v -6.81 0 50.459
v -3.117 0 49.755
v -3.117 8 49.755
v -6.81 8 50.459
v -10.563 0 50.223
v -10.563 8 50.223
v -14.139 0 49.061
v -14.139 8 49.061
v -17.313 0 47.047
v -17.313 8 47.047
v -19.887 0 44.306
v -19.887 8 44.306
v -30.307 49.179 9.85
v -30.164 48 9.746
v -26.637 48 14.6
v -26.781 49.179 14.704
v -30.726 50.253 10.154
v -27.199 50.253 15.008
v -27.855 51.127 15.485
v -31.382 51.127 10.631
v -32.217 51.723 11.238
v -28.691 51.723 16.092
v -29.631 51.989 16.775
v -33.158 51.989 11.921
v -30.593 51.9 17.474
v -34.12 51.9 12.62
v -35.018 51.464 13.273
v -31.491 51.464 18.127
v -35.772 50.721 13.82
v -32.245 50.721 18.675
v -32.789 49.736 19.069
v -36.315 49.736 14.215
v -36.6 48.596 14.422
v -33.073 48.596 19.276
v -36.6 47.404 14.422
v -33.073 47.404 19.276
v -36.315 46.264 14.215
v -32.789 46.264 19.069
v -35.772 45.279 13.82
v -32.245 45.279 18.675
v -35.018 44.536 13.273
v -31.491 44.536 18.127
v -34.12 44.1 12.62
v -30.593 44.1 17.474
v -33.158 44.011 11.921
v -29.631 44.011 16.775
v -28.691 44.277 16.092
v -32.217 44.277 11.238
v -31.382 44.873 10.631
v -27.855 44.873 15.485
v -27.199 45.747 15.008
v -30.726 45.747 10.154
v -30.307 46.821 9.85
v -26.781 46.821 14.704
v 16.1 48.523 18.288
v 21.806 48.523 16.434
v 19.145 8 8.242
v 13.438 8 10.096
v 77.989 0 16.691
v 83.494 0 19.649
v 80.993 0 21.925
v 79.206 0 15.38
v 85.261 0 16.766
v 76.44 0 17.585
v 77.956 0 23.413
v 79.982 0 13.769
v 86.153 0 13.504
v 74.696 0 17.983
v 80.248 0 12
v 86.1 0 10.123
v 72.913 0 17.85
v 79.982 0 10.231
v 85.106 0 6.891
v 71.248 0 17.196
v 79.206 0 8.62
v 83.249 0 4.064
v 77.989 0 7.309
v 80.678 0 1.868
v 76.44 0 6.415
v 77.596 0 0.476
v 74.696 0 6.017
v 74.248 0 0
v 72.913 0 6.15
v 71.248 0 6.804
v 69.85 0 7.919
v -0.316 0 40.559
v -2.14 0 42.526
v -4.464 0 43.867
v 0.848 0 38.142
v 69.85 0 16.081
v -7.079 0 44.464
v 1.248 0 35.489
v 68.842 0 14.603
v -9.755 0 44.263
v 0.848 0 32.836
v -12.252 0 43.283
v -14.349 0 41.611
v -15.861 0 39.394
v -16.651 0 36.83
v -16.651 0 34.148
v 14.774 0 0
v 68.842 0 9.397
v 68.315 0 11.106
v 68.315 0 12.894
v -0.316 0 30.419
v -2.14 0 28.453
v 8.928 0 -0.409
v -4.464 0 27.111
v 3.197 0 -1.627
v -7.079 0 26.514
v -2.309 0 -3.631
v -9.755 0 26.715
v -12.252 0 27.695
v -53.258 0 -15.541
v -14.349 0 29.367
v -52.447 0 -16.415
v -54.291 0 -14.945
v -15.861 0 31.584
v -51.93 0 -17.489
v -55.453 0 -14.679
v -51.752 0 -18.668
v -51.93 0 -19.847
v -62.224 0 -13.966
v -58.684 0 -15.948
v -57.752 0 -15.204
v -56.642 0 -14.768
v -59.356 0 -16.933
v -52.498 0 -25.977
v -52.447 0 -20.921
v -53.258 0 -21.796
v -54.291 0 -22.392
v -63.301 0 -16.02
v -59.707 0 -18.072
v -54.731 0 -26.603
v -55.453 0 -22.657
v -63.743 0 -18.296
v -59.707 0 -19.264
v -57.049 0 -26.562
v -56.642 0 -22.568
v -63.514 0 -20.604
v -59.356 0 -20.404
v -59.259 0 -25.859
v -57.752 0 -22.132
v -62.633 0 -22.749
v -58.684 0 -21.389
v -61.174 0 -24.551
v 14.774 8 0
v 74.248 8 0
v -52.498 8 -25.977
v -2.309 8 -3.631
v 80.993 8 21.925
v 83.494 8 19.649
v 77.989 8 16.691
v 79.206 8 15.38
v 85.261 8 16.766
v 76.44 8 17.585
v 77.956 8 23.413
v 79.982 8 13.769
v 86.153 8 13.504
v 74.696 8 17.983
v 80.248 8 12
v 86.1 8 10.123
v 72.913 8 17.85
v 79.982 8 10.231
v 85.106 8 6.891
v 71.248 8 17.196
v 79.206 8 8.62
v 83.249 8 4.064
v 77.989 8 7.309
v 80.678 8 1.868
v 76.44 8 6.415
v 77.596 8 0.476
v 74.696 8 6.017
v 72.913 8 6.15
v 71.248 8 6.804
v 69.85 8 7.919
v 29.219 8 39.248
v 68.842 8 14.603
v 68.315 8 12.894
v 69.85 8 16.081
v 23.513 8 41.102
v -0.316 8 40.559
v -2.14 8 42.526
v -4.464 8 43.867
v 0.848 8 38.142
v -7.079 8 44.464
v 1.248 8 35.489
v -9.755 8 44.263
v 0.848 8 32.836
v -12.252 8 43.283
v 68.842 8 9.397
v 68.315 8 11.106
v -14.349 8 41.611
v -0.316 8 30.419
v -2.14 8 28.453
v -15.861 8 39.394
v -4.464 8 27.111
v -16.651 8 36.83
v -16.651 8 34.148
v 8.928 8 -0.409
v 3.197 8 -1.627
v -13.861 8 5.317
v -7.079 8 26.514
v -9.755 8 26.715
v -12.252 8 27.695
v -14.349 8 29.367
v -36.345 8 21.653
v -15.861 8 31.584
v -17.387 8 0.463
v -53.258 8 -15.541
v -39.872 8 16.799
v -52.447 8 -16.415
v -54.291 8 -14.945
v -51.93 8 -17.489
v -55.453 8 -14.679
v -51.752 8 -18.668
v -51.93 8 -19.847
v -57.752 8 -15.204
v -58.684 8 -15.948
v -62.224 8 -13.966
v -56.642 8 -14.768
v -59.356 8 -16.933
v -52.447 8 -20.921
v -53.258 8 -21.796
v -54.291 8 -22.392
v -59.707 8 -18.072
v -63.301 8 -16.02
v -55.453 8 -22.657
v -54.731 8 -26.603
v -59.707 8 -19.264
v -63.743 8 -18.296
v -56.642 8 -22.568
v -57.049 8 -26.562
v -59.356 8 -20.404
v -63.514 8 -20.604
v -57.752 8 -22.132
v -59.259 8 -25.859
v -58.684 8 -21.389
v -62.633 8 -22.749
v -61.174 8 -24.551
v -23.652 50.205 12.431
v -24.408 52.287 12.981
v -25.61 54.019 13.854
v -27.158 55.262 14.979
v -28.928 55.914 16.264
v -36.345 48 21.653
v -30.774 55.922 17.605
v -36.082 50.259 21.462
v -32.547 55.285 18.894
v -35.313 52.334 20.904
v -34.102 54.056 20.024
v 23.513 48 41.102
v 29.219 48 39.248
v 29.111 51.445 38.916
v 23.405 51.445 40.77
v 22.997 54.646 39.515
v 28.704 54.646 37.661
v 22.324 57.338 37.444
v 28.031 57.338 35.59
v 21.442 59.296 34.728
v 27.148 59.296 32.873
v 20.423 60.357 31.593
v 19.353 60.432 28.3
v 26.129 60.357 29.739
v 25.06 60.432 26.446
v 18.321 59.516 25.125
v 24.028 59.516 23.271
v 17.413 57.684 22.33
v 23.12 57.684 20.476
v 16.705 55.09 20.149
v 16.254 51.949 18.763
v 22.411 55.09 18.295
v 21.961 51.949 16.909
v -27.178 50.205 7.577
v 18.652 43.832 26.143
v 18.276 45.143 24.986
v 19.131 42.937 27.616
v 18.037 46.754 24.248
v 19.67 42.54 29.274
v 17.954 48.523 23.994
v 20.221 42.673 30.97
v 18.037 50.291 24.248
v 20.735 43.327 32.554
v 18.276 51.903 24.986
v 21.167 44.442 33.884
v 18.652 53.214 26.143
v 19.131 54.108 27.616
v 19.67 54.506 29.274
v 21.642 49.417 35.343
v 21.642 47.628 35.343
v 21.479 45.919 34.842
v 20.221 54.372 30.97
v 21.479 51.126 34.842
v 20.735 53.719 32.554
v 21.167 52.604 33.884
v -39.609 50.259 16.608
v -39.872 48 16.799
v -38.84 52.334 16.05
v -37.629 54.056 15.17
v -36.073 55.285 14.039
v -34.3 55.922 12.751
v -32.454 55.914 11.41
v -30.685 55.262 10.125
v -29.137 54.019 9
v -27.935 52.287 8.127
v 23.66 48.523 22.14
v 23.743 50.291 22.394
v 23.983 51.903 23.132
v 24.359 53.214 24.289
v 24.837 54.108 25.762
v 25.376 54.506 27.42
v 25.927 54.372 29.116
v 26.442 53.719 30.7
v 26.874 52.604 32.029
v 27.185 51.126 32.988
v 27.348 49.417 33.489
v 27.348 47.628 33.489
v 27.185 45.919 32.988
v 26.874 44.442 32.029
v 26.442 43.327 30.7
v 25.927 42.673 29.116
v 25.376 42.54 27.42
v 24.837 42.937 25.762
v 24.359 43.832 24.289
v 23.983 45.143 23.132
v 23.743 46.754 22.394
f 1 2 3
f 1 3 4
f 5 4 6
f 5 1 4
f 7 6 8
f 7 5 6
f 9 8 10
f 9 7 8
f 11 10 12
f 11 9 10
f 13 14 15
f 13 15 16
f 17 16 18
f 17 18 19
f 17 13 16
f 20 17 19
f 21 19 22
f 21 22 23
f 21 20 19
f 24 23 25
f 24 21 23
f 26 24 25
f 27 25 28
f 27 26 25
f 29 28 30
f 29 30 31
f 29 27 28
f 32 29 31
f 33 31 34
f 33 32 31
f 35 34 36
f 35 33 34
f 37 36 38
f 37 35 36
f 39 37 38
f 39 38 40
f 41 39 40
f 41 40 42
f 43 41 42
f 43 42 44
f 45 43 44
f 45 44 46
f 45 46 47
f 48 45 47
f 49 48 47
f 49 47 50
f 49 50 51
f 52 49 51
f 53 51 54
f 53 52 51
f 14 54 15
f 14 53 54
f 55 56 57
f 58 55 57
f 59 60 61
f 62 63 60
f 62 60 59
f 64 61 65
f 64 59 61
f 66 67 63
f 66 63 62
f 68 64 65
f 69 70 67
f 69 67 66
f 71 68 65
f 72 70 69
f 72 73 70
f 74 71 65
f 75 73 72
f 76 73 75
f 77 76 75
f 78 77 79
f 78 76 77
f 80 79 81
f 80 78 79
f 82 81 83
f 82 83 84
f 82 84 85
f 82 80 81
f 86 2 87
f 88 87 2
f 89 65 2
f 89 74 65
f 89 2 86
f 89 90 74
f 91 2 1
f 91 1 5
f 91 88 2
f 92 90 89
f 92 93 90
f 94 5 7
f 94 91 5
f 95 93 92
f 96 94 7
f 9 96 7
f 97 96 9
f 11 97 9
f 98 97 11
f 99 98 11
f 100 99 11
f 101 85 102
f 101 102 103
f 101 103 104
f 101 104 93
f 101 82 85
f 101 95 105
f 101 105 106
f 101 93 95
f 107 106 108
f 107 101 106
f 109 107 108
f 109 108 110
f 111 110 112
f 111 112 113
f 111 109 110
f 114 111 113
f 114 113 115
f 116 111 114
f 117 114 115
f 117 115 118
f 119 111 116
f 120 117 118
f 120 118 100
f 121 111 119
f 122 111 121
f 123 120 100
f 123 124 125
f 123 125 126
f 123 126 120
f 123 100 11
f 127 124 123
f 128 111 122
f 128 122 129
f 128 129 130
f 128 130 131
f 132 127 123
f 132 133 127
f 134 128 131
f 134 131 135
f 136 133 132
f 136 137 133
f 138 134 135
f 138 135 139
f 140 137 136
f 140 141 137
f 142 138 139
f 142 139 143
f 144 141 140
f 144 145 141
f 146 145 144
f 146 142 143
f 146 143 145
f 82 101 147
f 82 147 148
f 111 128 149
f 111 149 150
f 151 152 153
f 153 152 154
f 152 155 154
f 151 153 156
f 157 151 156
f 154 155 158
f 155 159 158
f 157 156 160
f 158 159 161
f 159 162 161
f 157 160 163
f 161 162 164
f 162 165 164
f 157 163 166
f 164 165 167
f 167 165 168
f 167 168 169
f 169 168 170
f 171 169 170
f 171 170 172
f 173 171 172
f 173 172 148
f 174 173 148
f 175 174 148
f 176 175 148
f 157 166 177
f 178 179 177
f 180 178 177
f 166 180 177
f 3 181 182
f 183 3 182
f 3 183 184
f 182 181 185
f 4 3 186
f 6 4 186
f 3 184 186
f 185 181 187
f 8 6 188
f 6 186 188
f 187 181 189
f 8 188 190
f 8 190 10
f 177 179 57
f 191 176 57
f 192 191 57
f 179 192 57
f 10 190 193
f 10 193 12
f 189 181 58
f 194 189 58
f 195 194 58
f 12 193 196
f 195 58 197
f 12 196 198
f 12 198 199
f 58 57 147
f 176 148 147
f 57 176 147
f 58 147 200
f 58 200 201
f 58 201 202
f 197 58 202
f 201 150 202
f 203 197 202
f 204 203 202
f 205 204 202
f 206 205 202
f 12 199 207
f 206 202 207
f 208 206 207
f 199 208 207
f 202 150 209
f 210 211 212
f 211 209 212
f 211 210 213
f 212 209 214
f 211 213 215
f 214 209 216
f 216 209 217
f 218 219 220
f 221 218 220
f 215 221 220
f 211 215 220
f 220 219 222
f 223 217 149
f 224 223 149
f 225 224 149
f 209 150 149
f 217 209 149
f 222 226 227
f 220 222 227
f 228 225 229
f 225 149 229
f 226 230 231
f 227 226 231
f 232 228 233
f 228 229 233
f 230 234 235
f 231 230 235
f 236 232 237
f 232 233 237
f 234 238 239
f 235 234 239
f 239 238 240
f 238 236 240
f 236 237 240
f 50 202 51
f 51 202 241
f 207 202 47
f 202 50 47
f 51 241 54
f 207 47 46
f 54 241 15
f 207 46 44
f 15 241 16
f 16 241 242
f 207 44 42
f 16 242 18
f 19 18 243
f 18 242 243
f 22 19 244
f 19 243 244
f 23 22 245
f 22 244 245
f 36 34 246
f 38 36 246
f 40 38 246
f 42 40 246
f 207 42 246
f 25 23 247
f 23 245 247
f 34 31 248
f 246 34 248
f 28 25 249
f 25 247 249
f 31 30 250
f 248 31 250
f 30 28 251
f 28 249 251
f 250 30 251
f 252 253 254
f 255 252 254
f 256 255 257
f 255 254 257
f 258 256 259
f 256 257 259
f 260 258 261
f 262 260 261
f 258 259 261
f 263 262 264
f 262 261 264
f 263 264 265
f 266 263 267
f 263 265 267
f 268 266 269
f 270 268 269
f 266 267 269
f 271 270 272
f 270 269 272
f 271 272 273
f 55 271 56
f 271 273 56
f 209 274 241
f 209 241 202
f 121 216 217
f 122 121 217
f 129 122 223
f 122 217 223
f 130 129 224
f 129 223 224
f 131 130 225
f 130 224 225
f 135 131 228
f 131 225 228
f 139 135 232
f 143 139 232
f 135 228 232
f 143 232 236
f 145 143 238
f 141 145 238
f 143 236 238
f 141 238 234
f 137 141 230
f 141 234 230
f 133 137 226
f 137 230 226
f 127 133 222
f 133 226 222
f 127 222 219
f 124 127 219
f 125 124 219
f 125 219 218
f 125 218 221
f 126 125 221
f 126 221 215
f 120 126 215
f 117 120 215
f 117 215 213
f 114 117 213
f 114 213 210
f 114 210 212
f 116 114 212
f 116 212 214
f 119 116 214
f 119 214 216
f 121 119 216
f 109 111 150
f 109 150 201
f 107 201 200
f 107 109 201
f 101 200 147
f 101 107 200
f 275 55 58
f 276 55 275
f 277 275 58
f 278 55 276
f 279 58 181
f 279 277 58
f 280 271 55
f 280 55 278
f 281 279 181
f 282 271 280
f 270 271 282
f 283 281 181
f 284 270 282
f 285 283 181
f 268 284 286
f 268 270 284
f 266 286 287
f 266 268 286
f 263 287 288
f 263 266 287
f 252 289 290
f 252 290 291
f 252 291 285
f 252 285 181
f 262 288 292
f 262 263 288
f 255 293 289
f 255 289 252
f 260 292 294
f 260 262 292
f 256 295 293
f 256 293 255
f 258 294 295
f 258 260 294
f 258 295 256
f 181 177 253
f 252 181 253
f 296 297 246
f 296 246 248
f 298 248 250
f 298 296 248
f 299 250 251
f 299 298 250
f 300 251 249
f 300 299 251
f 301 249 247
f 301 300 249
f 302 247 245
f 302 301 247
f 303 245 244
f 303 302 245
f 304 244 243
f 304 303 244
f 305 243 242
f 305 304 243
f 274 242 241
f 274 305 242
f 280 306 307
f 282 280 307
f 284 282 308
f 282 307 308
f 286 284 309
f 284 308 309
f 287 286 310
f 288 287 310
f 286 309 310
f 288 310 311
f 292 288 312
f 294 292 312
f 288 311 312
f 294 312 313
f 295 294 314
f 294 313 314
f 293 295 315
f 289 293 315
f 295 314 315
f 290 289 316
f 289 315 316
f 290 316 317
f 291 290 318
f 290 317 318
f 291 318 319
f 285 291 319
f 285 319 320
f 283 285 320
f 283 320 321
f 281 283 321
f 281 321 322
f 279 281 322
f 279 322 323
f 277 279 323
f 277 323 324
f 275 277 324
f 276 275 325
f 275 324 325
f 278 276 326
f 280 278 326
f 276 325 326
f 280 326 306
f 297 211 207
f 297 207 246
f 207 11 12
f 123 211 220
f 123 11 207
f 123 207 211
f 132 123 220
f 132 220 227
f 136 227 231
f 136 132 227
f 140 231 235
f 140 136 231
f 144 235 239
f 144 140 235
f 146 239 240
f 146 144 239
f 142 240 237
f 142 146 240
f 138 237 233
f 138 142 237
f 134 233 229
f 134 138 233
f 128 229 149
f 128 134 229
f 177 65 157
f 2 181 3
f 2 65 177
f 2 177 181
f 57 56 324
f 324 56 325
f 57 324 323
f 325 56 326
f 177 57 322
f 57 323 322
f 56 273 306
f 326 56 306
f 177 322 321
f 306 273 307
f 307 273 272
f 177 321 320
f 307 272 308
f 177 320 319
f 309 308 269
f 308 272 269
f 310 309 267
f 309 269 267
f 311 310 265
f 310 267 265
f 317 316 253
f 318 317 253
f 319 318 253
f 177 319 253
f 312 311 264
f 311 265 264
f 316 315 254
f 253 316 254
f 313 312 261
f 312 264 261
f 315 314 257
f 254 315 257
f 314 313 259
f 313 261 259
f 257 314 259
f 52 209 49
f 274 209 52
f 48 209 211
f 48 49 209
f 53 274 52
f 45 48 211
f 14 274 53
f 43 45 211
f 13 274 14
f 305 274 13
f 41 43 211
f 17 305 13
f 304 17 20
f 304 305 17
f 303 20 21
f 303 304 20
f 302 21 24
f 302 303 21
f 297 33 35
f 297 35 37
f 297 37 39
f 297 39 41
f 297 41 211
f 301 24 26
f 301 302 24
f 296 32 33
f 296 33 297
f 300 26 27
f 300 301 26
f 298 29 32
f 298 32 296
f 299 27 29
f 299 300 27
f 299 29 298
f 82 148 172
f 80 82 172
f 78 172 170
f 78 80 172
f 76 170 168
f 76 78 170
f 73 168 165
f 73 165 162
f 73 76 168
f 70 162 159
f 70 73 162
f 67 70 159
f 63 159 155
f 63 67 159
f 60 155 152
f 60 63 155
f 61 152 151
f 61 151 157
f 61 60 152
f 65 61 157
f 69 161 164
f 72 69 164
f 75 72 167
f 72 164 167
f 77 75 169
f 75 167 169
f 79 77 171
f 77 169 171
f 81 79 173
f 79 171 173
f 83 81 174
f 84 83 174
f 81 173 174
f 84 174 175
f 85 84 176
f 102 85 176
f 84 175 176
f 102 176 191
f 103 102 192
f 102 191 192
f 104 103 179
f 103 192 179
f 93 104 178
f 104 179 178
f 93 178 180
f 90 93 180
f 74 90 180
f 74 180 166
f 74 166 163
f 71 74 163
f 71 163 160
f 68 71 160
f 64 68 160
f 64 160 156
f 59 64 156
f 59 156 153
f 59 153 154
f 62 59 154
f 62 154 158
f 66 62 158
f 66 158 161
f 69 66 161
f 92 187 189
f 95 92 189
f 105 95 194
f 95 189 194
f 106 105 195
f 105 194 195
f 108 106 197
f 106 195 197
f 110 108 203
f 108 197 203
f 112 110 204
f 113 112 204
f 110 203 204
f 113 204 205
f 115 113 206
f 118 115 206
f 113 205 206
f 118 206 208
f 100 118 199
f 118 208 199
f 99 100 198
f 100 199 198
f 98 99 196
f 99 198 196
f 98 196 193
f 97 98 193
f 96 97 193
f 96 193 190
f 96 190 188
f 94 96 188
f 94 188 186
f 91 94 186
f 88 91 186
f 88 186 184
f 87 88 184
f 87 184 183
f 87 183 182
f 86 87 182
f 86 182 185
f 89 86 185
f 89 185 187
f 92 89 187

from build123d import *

# Parameters (mm, degrees)
BOSS_EXTRUDE1_DEPTH = 8
SKETCH3_R           = 6
SKETCH3_R_2         = 4
SKETCH3_R_3         = 9
CUT_EXTRUDE1_DEPTH  = 34
SKETCH5_R           = 6
BOSS_EXTRUDE2_DEPTH = 6
SKETCH6_R           = 4
BOSS_EXTRUDE3_DEPTH = 6


with BuildPart() as part:
    # Sketch2 → Boss-Extrude1 (new body)
    with BuildSketch(Plane(origin=(0, 0, 0), x_dir=(1, 0, 0), z_dir=(0, 1, 0))):
        with BuildLine():
            Line((14.773677032, 0), (74.248108018, 0))
            ThreePointArc((74.248108018, 0), (86.100368105, -10.12278642), (77.956311951, -23.412678196))
            Line((77.956311951, -23.412678196), (-3.116637066, -49.754876163))
            ThreePointArc((-3.116637066, -49.754876163), (-12.387146898, -49.754876163), (-19.887146898, -44.305807203))
            Line((-19.887146898, -44.305807203), (-62.224027937, 13.965910429))
            ThreePointArc((-62.224027937, 13.965910429), (-61.969059674, 23.702755576), (-52.497998837, 25.976556108))
            Line((-52.497998837, 25.976556108), (-2.309261977, 3.631090779))
            ThreePointArc((-2.309261977, 3.631090779), (6.041386017, 0.917800769), (14.773677032, 0))
        make_face()
    extrude(amount=BOSS_EXTRUDE1_DEPTH)

    # Sketch3 → Cut-Extrude1 (cut)
    with BuildSketch(Plane(origin=(0, 8, 0), x_dir=(1, 0, 0), z_dir=(0, 1, 0))):
        with Locations((74.248108018, -12)):
            Circle(SKETCH3_R)
        with Locations((-55.751891982, 18.668192447)):
            Circle(SKETCH3_R_2)
        with Locations((-7.751891982, -35.489028418)):
            Circle(SKETCH3_R_3)
    extrude(amount=-CUT_EXTRUDE1_DEPTH, mode=Mode.SUBTRACT)

    # Sketch5 → Boss-Extrude2 (add)
    with BuildSketch(Plane(origin=(14.894305626, 0, -4.83945326), x_dir=(-0.309016994, 0, -0.951056516), z_dir=(0.951056516, 0, -0.309016994))):
        with BuildLine():
            Line((-46.356605373, 8), (-46.356605373, 48))
            ThreePointArc((-46.356605373, 48), (-34.62942849, 60.519891788), (-22.367996489, 48.522739904))
            Line((-22.367996489, 48.522739904), (-13.754622225, 8))
            Line((-13.754622225, 8), (-46.356605373, 8))
        make_face()
        with Locations((-34.367996489, 48.522739904)):
            Circle(SKETCH5_R, mode=Mode.SUBTRACT)
    extrude(amount=-BOSS_EXTRUDE2_DEPTH)

    # Sketch6 → Boss-Extrude3 (add)
    with BuildSketch(Plane(origin=(-5.786875521, 0, -7.964950844), x_dir=(0.809016994, 0, -0.587785252), z_dir=(0.587785252, 0, 0.809016994))):
        with BuildLine():
            Line((-42.131339875, 8), (-42.131339875, 46))
            Line((-42.131339875, 46), (-42.131339875, 48))
            ThreePointArc((-42.131339875, 48), (-35.244724682, 55.92214455), (-26.441246307, 50.205098847))
            Line((-26.441246307, 50.205098847), (-14.339128957, 8))
            Line((-14.339128957, 8), (-42.131339875, 8))
        make_face()
        with Locations((-34.131339875, 48)):
            Circle(SKETCH6_R, mode=Mode.SUBTRACT)
    extrude(amount=BOSS_EXTRUDE3_DEPTH)


solid = part.part
